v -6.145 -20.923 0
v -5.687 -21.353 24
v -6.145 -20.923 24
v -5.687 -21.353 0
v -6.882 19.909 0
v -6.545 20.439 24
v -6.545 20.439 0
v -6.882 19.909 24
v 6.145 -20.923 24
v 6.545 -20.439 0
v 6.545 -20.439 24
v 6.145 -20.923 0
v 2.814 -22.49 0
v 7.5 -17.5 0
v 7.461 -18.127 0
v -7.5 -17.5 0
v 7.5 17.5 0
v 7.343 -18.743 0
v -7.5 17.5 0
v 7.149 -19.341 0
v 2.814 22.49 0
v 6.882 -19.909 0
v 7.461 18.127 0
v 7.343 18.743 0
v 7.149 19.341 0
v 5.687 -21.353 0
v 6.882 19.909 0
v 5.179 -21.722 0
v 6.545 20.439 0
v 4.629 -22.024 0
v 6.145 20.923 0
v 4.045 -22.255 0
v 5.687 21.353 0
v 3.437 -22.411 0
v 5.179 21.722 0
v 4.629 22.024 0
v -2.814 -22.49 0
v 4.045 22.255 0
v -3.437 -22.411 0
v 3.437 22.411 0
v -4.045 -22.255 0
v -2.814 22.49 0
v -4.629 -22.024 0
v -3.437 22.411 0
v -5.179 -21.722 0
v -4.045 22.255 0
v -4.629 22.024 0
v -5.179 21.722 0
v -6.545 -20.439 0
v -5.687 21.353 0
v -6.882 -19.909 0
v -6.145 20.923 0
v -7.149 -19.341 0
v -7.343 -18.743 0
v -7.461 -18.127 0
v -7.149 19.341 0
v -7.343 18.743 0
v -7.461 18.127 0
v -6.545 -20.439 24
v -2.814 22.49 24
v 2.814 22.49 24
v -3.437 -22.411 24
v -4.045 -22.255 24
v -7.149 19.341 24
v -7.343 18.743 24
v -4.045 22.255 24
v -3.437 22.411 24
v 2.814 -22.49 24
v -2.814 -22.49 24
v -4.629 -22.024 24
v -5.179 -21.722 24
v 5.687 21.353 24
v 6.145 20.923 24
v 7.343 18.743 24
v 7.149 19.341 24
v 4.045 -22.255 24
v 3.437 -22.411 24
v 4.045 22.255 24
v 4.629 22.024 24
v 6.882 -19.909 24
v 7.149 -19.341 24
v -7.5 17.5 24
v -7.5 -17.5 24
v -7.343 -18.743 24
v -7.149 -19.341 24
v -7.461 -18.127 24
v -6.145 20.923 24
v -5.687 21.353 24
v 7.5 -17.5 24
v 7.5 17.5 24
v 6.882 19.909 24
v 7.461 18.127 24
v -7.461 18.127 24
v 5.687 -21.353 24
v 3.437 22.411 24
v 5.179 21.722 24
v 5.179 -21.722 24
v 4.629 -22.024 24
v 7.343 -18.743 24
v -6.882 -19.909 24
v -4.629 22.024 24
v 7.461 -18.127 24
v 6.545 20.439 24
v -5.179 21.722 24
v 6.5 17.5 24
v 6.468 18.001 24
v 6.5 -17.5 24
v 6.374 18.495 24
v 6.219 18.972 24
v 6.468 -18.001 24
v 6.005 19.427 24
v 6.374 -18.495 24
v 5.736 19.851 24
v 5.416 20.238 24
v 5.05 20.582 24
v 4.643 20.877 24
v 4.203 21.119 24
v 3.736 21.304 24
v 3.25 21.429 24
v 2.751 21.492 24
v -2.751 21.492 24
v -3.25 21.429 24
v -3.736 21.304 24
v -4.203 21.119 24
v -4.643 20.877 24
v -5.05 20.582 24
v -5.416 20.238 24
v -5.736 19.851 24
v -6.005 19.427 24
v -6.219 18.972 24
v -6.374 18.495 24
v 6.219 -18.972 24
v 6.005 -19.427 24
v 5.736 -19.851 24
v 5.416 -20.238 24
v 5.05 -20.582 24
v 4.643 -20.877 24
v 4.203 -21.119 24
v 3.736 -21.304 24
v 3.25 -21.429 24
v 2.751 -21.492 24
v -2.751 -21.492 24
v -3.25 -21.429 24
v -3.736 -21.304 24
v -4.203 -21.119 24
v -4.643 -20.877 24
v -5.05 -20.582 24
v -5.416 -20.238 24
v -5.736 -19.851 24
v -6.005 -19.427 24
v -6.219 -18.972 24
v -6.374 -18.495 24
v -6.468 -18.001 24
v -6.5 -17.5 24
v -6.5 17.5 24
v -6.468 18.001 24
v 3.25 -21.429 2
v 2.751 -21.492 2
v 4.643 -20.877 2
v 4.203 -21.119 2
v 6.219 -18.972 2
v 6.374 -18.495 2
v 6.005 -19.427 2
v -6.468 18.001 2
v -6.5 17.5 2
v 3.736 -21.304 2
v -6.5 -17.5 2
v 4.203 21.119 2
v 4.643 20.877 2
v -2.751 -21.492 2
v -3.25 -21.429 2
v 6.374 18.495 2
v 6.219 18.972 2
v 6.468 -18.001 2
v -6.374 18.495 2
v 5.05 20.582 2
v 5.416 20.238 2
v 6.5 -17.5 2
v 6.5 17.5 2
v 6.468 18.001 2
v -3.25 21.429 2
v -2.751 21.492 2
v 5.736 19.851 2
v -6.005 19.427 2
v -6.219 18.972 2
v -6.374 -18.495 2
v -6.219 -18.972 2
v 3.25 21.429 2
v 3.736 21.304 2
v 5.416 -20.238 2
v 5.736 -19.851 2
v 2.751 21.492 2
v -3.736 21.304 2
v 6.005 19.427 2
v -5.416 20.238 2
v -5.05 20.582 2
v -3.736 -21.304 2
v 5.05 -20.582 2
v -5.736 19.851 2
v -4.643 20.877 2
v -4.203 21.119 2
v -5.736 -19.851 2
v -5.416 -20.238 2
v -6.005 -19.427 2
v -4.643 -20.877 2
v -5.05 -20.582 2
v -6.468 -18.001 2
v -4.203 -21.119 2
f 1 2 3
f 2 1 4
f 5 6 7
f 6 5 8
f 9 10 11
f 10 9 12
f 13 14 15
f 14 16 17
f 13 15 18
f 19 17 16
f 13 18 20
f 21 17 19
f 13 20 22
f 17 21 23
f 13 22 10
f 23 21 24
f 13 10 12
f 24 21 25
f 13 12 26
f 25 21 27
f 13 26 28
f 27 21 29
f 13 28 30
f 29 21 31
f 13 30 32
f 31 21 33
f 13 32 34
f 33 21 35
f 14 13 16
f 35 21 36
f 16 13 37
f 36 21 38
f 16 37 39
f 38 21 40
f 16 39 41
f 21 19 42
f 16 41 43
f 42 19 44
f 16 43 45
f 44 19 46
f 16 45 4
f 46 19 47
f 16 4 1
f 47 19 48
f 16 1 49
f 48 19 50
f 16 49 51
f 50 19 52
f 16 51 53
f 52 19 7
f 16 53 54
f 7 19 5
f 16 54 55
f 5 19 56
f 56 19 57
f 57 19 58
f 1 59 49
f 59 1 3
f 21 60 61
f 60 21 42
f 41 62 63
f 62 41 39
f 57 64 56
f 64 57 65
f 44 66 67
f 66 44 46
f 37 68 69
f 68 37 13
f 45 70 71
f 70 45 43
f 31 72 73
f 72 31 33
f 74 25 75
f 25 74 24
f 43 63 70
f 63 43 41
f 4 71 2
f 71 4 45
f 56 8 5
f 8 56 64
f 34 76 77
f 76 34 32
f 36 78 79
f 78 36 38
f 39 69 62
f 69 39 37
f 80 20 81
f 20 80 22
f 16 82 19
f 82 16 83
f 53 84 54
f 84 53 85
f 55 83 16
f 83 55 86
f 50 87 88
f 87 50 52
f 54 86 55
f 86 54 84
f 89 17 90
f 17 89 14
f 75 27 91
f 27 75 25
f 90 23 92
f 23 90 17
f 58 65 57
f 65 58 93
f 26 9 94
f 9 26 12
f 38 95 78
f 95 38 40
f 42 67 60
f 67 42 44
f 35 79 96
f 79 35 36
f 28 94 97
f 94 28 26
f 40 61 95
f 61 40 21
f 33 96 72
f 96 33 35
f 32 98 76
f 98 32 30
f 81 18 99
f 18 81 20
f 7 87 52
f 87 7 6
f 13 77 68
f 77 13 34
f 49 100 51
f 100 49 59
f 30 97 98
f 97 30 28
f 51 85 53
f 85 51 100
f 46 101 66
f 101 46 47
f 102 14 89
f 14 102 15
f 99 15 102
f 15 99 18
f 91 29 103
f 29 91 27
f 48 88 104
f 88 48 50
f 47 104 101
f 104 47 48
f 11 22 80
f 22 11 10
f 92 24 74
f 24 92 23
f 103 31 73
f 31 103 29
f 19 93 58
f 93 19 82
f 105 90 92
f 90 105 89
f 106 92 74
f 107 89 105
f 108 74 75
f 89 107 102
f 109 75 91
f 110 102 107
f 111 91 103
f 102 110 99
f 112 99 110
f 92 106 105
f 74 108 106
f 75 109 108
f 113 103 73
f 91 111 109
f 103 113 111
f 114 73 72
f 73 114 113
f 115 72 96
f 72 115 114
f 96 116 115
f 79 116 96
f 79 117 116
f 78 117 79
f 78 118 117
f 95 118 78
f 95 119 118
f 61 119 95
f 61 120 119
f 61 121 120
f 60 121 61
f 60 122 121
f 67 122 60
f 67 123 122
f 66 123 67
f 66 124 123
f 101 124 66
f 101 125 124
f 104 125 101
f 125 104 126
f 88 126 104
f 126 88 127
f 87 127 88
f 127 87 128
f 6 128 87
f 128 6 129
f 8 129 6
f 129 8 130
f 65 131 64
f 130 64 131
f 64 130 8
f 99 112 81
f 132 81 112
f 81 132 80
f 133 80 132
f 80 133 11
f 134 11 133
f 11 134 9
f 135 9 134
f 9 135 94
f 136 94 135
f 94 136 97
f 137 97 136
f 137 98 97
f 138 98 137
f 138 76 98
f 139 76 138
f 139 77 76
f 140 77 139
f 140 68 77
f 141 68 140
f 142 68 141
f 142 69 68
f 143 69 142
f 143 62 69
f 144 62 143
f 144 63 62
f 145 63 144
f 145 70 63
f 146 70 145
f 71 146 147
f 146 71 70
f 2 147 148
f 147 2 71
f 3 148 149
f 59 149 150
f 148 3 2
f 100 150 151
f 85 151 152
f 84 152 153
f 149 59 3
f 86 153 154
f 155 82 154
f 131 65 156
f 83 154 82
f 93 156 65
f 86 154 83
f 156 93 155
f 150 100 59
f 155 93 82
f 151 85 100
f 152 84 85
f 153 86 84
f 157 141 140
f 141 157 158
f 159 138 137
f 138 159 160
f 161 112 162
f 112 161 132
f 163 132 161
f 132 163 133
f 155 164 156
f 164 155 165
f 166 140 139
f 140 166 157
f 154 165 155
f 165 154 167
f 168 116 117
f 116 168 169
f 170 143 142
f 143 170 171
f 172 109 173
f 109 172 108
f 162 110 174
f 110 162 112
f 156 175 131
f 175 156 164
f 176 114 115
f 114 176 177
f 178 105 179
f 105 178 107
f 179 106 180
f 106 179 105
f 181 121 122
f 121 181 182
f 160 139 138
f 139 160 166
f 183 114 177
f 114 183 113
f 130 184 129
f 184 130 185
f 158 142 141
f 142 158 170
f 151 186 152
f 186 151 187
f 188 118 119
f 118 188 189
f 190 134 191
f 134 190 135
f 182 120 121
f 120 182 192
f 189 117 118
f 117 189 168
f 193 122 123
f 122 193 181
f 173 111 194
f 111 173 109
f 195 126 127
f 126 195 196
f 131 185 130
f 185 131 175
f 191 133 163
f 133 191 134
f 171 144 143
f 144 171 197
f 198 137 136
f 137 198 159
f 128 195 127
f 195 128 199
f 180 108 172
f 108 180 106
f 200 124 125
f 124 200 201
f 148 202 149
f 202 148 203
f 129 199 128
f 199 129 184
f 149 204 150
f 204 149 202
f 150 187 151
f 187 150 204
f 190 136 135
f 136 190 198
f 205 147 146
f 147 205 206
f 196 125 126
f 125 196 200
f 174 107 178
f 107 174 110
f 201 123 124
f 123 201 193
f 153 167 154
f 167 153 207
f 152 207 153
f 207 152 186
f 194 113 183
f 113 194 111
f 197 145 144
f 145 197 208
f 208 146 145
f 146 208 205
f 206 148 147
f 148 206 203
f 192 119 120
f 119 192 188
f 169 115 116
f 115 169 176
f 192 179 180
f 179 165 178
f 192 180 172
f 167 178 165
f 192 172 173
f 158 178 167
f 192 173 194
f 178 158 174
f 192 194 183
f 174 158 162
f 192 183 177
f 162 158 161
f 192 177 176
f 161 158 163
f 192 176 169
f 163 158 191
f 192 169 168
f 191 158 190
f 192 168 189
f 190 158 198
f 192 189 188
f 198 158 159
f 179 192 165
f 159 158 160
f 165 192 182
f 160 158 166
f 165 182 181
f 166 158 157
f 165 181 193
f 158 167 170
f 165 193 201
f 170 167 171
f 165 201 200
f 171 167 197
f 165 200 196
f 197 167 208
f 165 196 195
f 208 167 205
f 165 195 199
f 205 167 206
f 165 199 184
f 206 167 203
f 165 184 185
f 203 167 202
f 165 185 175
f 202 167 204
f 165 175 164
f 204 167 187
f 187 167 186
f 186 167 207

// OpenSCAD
$fn = 50;


difference() {
	union() {
		hull() {
			translate(v = [-2.5000000000, 17.5000000000, 0]) {
				cylinder(h = 24, r = 5);
			}
			translate(v = [2.5000000000, 17.5000000000, 0]) {
				cylinder(h = 24, r = 5);
			}
			translate(v = [-2.5000000000, -17.5000000000, 0]) {
				cylinder(h = 24, r = 5);
			}
			translate(v = [2.5000000000, -17.5000000000, 0]) {
				cylinder(h = 24, r = 5);
			}
		}
	}
	union() {
		translate(v = [0, 0, 2]) {
			hull() {
				translate(v = [-2.5000000000, 17.5000000000, 0]) {
					cylinder(h = 22, r = 4);
				}
				translate(v = [2.5000000000, 17.5000000000, 0]) {
					cylinder(h = 22, r = 4);
				}
				translate(v = [-2.5000000000, -17.5000000000, 0]) {
					cylinder(h = 22, r = 4);
				}
				translate(v = [2.5000000000, -17.5000000000, 0]) {
					cylinder(h = 22, r = 4);
				}
			}
		}
	}
}
